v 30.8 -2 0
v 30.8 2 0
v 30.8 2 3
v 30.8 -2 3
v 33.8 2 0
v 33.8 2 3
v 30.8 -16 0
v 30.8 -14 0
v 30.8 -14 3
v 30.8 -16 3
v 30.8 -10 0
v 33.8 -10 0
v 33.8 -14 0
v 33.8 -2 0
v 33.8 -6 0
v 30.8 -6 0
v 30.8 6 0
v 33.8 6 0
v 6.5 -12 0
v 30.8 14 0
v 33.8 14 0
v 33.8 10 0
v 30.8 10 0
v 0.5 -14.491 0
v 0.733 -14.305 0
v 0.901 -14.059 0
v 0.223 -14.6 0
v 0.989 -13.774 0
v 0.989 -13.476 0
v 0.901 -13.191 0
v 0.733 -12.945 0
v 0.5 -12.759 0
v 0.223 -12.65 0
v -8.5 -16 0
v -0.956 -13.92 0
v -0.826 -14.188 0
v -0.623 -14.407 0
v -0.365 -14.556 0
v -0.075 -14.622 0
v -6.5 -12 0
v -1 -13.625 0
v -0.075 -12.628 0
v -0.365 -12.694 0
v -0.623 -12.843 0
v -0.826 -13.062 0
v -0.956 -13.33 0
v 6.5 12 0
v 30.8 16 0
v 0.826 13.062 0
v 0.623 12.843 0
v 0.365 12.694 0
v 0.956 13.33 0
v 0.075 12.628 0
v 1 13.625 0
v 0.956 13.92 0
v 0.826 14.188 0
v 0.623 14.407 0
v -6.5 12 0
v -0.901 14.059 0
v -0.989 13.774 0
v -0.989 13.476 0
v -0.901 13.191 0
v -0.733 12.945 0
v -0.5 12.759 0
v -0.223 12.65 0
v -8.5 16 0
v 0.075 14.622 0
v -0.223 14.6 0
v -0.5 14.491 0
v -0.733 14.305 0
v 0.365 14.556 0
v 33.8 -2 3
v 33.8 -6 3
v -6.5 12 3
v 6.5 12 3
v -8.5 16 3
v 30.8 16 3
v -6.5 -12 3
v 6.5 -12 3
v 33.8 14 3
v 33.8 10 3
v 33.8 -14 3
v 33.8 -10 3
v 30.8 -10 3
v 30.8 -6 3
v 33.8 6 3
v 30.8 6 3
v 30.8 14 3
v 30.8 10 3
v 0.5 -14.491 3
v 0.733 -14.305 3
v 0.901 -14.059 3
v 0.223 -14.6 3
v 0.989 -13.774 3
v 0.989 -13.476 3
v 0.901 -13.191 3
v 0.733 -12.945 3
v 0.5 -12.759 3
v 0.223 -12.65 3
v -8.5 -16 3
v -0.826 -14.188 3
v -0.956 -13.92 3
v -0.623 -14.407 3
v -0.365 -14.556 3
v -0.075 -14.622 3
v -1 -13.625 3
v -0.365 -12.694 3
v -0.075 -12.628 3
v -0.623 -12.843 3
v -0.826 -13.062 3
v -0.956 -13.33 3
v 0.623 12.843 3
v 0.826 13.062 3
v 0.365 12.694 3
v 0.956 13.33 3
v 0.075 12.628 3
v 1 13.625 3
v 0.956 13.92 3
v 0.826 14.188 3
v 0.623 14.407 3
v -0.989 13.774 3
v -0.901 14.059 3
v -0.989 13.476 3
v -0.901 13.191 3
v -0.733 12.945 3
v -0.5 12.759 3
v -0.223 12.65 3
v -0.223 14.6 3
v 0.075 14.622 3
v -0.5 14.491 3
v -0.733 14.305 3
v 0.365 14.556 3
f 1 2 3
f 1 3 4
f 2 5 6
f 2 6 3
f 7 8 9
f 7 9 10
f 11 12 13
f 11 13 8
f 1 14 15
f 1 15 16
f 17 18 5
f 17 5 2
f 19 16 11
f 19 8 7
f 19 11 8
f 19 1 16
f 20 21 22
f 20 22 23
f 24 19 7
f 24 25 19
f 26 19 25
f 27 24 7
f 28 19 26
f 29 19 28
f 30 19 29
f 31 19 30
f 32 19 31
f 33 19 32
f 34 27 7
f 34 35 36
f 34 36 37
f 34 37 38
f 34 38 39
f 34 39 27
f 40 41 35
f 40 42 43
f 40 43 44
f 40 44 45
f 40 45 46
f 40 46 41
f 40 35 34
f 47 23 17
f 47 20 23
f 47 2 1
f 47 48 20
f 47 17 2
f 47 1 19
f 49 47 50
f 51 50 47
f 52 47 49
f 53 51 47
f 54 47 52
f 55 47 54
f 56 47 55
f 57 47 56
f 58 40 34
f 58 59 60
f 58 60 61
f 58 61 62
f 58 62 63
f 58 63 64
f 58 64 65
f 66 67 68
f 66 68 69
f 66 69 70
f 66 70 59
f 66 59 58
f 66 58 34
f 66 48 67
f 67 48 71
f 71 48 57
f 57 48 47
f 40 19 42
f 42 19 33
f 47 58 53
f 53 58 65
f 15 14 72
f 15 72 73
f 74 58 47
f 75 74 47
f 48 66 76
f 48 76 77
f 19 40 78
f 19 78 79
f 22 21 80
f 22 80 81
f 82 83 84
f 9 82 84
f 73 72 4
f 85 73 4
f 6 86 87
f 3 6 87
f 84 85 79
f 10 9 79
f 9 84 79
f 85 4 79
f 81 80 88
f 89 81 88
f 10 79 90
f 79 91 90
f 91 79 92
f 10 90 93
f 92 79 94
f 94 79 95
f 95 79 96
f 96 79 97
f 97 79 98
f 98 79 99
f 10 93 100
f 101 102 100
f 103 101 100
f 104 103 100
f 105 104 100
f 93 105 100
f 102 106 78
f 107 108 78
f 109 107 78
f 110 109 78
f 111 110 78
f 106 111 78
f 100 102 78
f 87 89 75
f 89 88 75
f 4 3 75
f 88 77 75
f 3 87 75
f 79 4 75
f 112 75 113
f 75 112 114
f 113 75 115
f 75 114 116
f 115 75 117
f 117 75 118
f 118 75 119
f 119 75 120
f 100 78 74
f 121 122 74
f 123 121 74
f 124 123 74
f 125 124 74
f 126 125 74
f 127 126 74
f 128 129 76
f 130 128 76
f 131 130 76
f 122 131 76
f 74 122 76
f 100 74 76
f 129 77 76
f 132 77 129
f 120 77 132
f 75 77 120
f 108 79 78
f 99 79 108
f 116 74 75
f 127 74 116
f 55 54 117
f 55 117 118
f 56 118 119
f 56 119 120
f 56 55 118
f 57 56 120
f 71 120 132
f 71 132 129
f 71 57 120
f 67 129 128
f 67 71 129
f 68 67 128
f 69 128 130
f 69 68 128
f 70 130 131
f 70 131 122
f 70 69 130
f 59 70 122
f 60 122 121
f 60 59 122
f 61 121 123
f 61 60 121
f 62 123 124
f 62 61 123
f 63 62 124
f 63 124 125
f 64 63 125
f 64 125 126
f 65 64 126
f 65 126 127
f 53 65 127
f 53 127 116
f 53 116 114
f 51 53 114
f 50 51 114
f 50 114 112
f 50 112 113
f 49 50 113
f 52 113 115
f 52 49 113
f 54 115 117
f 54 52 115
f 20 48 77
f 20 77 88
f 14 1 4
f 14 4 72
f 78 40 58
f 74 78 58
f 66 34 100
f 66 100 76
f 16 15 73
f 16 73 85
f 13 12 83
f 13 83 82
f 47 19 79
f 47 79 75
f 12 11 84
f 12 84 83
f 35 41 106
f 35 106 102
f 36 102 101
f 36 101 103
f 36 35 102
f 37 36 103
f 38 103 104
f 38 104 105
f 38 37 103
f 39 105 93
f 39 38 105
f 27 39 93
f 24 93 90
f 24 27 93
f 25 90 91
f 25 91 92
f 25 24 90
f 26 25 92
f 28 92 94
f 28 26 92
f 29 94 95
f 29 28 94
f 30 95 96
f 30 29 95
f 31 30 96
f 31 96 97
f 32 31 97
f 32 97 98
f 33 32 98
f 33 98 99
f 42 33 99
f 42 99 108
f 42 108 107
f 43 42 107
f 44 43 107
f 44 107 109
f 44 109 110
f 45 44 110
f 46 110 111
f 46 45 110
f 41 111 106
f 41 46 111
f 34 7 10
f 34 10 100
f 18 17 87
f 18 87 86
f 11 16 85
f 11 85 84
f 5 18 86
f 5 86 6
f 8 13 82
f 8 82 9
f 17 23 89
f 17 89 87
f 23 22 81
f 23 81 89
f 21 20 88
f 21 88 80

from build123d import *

# Parameters (mm, degrees)
SKETCH1_R           = 1
SKETCH1_W           = 13
SKETCH1_H           = 24
BOSS_EXTRUDE1_DEPTH = 3


with BuildPart() as part:
    # Sketch1 → Boss-Extrude1 (new body)
    with BuildSketch(Plane.XY):
        Polygon((30.8, 14), (33.8, 14), (33.8, 10), (30.8, 10), (30.8, 6), (33.8, 6), (33.8, 2), (30.8, 2), (30.8, -2), (33.8, -2), (33.8, -6), (30.8, -6), (30.8, -10), (33.8, -10), (33.8, -14), (30.8, -14), (30.8, -16), (-8.5, -16), (-8.5, 16), (30.8, 16), align=None)
        with Locations((0, 13.625)):
            Circle(SKETCH1_R, mode=Mode.SUBTRACT)
        with Locations(Location((0, -13.625, 0), (0, 0, 180))):
            Circle(SKETCH1_R, mode=Mode.SUBTRACT)
        Rectangle(SKETCH1_W, SKETCH1_H, mode=Mode.SUBTRACT)
    extrude(amount=BOSS_EXTRUDE1_DEPTH)


solid = part.part
